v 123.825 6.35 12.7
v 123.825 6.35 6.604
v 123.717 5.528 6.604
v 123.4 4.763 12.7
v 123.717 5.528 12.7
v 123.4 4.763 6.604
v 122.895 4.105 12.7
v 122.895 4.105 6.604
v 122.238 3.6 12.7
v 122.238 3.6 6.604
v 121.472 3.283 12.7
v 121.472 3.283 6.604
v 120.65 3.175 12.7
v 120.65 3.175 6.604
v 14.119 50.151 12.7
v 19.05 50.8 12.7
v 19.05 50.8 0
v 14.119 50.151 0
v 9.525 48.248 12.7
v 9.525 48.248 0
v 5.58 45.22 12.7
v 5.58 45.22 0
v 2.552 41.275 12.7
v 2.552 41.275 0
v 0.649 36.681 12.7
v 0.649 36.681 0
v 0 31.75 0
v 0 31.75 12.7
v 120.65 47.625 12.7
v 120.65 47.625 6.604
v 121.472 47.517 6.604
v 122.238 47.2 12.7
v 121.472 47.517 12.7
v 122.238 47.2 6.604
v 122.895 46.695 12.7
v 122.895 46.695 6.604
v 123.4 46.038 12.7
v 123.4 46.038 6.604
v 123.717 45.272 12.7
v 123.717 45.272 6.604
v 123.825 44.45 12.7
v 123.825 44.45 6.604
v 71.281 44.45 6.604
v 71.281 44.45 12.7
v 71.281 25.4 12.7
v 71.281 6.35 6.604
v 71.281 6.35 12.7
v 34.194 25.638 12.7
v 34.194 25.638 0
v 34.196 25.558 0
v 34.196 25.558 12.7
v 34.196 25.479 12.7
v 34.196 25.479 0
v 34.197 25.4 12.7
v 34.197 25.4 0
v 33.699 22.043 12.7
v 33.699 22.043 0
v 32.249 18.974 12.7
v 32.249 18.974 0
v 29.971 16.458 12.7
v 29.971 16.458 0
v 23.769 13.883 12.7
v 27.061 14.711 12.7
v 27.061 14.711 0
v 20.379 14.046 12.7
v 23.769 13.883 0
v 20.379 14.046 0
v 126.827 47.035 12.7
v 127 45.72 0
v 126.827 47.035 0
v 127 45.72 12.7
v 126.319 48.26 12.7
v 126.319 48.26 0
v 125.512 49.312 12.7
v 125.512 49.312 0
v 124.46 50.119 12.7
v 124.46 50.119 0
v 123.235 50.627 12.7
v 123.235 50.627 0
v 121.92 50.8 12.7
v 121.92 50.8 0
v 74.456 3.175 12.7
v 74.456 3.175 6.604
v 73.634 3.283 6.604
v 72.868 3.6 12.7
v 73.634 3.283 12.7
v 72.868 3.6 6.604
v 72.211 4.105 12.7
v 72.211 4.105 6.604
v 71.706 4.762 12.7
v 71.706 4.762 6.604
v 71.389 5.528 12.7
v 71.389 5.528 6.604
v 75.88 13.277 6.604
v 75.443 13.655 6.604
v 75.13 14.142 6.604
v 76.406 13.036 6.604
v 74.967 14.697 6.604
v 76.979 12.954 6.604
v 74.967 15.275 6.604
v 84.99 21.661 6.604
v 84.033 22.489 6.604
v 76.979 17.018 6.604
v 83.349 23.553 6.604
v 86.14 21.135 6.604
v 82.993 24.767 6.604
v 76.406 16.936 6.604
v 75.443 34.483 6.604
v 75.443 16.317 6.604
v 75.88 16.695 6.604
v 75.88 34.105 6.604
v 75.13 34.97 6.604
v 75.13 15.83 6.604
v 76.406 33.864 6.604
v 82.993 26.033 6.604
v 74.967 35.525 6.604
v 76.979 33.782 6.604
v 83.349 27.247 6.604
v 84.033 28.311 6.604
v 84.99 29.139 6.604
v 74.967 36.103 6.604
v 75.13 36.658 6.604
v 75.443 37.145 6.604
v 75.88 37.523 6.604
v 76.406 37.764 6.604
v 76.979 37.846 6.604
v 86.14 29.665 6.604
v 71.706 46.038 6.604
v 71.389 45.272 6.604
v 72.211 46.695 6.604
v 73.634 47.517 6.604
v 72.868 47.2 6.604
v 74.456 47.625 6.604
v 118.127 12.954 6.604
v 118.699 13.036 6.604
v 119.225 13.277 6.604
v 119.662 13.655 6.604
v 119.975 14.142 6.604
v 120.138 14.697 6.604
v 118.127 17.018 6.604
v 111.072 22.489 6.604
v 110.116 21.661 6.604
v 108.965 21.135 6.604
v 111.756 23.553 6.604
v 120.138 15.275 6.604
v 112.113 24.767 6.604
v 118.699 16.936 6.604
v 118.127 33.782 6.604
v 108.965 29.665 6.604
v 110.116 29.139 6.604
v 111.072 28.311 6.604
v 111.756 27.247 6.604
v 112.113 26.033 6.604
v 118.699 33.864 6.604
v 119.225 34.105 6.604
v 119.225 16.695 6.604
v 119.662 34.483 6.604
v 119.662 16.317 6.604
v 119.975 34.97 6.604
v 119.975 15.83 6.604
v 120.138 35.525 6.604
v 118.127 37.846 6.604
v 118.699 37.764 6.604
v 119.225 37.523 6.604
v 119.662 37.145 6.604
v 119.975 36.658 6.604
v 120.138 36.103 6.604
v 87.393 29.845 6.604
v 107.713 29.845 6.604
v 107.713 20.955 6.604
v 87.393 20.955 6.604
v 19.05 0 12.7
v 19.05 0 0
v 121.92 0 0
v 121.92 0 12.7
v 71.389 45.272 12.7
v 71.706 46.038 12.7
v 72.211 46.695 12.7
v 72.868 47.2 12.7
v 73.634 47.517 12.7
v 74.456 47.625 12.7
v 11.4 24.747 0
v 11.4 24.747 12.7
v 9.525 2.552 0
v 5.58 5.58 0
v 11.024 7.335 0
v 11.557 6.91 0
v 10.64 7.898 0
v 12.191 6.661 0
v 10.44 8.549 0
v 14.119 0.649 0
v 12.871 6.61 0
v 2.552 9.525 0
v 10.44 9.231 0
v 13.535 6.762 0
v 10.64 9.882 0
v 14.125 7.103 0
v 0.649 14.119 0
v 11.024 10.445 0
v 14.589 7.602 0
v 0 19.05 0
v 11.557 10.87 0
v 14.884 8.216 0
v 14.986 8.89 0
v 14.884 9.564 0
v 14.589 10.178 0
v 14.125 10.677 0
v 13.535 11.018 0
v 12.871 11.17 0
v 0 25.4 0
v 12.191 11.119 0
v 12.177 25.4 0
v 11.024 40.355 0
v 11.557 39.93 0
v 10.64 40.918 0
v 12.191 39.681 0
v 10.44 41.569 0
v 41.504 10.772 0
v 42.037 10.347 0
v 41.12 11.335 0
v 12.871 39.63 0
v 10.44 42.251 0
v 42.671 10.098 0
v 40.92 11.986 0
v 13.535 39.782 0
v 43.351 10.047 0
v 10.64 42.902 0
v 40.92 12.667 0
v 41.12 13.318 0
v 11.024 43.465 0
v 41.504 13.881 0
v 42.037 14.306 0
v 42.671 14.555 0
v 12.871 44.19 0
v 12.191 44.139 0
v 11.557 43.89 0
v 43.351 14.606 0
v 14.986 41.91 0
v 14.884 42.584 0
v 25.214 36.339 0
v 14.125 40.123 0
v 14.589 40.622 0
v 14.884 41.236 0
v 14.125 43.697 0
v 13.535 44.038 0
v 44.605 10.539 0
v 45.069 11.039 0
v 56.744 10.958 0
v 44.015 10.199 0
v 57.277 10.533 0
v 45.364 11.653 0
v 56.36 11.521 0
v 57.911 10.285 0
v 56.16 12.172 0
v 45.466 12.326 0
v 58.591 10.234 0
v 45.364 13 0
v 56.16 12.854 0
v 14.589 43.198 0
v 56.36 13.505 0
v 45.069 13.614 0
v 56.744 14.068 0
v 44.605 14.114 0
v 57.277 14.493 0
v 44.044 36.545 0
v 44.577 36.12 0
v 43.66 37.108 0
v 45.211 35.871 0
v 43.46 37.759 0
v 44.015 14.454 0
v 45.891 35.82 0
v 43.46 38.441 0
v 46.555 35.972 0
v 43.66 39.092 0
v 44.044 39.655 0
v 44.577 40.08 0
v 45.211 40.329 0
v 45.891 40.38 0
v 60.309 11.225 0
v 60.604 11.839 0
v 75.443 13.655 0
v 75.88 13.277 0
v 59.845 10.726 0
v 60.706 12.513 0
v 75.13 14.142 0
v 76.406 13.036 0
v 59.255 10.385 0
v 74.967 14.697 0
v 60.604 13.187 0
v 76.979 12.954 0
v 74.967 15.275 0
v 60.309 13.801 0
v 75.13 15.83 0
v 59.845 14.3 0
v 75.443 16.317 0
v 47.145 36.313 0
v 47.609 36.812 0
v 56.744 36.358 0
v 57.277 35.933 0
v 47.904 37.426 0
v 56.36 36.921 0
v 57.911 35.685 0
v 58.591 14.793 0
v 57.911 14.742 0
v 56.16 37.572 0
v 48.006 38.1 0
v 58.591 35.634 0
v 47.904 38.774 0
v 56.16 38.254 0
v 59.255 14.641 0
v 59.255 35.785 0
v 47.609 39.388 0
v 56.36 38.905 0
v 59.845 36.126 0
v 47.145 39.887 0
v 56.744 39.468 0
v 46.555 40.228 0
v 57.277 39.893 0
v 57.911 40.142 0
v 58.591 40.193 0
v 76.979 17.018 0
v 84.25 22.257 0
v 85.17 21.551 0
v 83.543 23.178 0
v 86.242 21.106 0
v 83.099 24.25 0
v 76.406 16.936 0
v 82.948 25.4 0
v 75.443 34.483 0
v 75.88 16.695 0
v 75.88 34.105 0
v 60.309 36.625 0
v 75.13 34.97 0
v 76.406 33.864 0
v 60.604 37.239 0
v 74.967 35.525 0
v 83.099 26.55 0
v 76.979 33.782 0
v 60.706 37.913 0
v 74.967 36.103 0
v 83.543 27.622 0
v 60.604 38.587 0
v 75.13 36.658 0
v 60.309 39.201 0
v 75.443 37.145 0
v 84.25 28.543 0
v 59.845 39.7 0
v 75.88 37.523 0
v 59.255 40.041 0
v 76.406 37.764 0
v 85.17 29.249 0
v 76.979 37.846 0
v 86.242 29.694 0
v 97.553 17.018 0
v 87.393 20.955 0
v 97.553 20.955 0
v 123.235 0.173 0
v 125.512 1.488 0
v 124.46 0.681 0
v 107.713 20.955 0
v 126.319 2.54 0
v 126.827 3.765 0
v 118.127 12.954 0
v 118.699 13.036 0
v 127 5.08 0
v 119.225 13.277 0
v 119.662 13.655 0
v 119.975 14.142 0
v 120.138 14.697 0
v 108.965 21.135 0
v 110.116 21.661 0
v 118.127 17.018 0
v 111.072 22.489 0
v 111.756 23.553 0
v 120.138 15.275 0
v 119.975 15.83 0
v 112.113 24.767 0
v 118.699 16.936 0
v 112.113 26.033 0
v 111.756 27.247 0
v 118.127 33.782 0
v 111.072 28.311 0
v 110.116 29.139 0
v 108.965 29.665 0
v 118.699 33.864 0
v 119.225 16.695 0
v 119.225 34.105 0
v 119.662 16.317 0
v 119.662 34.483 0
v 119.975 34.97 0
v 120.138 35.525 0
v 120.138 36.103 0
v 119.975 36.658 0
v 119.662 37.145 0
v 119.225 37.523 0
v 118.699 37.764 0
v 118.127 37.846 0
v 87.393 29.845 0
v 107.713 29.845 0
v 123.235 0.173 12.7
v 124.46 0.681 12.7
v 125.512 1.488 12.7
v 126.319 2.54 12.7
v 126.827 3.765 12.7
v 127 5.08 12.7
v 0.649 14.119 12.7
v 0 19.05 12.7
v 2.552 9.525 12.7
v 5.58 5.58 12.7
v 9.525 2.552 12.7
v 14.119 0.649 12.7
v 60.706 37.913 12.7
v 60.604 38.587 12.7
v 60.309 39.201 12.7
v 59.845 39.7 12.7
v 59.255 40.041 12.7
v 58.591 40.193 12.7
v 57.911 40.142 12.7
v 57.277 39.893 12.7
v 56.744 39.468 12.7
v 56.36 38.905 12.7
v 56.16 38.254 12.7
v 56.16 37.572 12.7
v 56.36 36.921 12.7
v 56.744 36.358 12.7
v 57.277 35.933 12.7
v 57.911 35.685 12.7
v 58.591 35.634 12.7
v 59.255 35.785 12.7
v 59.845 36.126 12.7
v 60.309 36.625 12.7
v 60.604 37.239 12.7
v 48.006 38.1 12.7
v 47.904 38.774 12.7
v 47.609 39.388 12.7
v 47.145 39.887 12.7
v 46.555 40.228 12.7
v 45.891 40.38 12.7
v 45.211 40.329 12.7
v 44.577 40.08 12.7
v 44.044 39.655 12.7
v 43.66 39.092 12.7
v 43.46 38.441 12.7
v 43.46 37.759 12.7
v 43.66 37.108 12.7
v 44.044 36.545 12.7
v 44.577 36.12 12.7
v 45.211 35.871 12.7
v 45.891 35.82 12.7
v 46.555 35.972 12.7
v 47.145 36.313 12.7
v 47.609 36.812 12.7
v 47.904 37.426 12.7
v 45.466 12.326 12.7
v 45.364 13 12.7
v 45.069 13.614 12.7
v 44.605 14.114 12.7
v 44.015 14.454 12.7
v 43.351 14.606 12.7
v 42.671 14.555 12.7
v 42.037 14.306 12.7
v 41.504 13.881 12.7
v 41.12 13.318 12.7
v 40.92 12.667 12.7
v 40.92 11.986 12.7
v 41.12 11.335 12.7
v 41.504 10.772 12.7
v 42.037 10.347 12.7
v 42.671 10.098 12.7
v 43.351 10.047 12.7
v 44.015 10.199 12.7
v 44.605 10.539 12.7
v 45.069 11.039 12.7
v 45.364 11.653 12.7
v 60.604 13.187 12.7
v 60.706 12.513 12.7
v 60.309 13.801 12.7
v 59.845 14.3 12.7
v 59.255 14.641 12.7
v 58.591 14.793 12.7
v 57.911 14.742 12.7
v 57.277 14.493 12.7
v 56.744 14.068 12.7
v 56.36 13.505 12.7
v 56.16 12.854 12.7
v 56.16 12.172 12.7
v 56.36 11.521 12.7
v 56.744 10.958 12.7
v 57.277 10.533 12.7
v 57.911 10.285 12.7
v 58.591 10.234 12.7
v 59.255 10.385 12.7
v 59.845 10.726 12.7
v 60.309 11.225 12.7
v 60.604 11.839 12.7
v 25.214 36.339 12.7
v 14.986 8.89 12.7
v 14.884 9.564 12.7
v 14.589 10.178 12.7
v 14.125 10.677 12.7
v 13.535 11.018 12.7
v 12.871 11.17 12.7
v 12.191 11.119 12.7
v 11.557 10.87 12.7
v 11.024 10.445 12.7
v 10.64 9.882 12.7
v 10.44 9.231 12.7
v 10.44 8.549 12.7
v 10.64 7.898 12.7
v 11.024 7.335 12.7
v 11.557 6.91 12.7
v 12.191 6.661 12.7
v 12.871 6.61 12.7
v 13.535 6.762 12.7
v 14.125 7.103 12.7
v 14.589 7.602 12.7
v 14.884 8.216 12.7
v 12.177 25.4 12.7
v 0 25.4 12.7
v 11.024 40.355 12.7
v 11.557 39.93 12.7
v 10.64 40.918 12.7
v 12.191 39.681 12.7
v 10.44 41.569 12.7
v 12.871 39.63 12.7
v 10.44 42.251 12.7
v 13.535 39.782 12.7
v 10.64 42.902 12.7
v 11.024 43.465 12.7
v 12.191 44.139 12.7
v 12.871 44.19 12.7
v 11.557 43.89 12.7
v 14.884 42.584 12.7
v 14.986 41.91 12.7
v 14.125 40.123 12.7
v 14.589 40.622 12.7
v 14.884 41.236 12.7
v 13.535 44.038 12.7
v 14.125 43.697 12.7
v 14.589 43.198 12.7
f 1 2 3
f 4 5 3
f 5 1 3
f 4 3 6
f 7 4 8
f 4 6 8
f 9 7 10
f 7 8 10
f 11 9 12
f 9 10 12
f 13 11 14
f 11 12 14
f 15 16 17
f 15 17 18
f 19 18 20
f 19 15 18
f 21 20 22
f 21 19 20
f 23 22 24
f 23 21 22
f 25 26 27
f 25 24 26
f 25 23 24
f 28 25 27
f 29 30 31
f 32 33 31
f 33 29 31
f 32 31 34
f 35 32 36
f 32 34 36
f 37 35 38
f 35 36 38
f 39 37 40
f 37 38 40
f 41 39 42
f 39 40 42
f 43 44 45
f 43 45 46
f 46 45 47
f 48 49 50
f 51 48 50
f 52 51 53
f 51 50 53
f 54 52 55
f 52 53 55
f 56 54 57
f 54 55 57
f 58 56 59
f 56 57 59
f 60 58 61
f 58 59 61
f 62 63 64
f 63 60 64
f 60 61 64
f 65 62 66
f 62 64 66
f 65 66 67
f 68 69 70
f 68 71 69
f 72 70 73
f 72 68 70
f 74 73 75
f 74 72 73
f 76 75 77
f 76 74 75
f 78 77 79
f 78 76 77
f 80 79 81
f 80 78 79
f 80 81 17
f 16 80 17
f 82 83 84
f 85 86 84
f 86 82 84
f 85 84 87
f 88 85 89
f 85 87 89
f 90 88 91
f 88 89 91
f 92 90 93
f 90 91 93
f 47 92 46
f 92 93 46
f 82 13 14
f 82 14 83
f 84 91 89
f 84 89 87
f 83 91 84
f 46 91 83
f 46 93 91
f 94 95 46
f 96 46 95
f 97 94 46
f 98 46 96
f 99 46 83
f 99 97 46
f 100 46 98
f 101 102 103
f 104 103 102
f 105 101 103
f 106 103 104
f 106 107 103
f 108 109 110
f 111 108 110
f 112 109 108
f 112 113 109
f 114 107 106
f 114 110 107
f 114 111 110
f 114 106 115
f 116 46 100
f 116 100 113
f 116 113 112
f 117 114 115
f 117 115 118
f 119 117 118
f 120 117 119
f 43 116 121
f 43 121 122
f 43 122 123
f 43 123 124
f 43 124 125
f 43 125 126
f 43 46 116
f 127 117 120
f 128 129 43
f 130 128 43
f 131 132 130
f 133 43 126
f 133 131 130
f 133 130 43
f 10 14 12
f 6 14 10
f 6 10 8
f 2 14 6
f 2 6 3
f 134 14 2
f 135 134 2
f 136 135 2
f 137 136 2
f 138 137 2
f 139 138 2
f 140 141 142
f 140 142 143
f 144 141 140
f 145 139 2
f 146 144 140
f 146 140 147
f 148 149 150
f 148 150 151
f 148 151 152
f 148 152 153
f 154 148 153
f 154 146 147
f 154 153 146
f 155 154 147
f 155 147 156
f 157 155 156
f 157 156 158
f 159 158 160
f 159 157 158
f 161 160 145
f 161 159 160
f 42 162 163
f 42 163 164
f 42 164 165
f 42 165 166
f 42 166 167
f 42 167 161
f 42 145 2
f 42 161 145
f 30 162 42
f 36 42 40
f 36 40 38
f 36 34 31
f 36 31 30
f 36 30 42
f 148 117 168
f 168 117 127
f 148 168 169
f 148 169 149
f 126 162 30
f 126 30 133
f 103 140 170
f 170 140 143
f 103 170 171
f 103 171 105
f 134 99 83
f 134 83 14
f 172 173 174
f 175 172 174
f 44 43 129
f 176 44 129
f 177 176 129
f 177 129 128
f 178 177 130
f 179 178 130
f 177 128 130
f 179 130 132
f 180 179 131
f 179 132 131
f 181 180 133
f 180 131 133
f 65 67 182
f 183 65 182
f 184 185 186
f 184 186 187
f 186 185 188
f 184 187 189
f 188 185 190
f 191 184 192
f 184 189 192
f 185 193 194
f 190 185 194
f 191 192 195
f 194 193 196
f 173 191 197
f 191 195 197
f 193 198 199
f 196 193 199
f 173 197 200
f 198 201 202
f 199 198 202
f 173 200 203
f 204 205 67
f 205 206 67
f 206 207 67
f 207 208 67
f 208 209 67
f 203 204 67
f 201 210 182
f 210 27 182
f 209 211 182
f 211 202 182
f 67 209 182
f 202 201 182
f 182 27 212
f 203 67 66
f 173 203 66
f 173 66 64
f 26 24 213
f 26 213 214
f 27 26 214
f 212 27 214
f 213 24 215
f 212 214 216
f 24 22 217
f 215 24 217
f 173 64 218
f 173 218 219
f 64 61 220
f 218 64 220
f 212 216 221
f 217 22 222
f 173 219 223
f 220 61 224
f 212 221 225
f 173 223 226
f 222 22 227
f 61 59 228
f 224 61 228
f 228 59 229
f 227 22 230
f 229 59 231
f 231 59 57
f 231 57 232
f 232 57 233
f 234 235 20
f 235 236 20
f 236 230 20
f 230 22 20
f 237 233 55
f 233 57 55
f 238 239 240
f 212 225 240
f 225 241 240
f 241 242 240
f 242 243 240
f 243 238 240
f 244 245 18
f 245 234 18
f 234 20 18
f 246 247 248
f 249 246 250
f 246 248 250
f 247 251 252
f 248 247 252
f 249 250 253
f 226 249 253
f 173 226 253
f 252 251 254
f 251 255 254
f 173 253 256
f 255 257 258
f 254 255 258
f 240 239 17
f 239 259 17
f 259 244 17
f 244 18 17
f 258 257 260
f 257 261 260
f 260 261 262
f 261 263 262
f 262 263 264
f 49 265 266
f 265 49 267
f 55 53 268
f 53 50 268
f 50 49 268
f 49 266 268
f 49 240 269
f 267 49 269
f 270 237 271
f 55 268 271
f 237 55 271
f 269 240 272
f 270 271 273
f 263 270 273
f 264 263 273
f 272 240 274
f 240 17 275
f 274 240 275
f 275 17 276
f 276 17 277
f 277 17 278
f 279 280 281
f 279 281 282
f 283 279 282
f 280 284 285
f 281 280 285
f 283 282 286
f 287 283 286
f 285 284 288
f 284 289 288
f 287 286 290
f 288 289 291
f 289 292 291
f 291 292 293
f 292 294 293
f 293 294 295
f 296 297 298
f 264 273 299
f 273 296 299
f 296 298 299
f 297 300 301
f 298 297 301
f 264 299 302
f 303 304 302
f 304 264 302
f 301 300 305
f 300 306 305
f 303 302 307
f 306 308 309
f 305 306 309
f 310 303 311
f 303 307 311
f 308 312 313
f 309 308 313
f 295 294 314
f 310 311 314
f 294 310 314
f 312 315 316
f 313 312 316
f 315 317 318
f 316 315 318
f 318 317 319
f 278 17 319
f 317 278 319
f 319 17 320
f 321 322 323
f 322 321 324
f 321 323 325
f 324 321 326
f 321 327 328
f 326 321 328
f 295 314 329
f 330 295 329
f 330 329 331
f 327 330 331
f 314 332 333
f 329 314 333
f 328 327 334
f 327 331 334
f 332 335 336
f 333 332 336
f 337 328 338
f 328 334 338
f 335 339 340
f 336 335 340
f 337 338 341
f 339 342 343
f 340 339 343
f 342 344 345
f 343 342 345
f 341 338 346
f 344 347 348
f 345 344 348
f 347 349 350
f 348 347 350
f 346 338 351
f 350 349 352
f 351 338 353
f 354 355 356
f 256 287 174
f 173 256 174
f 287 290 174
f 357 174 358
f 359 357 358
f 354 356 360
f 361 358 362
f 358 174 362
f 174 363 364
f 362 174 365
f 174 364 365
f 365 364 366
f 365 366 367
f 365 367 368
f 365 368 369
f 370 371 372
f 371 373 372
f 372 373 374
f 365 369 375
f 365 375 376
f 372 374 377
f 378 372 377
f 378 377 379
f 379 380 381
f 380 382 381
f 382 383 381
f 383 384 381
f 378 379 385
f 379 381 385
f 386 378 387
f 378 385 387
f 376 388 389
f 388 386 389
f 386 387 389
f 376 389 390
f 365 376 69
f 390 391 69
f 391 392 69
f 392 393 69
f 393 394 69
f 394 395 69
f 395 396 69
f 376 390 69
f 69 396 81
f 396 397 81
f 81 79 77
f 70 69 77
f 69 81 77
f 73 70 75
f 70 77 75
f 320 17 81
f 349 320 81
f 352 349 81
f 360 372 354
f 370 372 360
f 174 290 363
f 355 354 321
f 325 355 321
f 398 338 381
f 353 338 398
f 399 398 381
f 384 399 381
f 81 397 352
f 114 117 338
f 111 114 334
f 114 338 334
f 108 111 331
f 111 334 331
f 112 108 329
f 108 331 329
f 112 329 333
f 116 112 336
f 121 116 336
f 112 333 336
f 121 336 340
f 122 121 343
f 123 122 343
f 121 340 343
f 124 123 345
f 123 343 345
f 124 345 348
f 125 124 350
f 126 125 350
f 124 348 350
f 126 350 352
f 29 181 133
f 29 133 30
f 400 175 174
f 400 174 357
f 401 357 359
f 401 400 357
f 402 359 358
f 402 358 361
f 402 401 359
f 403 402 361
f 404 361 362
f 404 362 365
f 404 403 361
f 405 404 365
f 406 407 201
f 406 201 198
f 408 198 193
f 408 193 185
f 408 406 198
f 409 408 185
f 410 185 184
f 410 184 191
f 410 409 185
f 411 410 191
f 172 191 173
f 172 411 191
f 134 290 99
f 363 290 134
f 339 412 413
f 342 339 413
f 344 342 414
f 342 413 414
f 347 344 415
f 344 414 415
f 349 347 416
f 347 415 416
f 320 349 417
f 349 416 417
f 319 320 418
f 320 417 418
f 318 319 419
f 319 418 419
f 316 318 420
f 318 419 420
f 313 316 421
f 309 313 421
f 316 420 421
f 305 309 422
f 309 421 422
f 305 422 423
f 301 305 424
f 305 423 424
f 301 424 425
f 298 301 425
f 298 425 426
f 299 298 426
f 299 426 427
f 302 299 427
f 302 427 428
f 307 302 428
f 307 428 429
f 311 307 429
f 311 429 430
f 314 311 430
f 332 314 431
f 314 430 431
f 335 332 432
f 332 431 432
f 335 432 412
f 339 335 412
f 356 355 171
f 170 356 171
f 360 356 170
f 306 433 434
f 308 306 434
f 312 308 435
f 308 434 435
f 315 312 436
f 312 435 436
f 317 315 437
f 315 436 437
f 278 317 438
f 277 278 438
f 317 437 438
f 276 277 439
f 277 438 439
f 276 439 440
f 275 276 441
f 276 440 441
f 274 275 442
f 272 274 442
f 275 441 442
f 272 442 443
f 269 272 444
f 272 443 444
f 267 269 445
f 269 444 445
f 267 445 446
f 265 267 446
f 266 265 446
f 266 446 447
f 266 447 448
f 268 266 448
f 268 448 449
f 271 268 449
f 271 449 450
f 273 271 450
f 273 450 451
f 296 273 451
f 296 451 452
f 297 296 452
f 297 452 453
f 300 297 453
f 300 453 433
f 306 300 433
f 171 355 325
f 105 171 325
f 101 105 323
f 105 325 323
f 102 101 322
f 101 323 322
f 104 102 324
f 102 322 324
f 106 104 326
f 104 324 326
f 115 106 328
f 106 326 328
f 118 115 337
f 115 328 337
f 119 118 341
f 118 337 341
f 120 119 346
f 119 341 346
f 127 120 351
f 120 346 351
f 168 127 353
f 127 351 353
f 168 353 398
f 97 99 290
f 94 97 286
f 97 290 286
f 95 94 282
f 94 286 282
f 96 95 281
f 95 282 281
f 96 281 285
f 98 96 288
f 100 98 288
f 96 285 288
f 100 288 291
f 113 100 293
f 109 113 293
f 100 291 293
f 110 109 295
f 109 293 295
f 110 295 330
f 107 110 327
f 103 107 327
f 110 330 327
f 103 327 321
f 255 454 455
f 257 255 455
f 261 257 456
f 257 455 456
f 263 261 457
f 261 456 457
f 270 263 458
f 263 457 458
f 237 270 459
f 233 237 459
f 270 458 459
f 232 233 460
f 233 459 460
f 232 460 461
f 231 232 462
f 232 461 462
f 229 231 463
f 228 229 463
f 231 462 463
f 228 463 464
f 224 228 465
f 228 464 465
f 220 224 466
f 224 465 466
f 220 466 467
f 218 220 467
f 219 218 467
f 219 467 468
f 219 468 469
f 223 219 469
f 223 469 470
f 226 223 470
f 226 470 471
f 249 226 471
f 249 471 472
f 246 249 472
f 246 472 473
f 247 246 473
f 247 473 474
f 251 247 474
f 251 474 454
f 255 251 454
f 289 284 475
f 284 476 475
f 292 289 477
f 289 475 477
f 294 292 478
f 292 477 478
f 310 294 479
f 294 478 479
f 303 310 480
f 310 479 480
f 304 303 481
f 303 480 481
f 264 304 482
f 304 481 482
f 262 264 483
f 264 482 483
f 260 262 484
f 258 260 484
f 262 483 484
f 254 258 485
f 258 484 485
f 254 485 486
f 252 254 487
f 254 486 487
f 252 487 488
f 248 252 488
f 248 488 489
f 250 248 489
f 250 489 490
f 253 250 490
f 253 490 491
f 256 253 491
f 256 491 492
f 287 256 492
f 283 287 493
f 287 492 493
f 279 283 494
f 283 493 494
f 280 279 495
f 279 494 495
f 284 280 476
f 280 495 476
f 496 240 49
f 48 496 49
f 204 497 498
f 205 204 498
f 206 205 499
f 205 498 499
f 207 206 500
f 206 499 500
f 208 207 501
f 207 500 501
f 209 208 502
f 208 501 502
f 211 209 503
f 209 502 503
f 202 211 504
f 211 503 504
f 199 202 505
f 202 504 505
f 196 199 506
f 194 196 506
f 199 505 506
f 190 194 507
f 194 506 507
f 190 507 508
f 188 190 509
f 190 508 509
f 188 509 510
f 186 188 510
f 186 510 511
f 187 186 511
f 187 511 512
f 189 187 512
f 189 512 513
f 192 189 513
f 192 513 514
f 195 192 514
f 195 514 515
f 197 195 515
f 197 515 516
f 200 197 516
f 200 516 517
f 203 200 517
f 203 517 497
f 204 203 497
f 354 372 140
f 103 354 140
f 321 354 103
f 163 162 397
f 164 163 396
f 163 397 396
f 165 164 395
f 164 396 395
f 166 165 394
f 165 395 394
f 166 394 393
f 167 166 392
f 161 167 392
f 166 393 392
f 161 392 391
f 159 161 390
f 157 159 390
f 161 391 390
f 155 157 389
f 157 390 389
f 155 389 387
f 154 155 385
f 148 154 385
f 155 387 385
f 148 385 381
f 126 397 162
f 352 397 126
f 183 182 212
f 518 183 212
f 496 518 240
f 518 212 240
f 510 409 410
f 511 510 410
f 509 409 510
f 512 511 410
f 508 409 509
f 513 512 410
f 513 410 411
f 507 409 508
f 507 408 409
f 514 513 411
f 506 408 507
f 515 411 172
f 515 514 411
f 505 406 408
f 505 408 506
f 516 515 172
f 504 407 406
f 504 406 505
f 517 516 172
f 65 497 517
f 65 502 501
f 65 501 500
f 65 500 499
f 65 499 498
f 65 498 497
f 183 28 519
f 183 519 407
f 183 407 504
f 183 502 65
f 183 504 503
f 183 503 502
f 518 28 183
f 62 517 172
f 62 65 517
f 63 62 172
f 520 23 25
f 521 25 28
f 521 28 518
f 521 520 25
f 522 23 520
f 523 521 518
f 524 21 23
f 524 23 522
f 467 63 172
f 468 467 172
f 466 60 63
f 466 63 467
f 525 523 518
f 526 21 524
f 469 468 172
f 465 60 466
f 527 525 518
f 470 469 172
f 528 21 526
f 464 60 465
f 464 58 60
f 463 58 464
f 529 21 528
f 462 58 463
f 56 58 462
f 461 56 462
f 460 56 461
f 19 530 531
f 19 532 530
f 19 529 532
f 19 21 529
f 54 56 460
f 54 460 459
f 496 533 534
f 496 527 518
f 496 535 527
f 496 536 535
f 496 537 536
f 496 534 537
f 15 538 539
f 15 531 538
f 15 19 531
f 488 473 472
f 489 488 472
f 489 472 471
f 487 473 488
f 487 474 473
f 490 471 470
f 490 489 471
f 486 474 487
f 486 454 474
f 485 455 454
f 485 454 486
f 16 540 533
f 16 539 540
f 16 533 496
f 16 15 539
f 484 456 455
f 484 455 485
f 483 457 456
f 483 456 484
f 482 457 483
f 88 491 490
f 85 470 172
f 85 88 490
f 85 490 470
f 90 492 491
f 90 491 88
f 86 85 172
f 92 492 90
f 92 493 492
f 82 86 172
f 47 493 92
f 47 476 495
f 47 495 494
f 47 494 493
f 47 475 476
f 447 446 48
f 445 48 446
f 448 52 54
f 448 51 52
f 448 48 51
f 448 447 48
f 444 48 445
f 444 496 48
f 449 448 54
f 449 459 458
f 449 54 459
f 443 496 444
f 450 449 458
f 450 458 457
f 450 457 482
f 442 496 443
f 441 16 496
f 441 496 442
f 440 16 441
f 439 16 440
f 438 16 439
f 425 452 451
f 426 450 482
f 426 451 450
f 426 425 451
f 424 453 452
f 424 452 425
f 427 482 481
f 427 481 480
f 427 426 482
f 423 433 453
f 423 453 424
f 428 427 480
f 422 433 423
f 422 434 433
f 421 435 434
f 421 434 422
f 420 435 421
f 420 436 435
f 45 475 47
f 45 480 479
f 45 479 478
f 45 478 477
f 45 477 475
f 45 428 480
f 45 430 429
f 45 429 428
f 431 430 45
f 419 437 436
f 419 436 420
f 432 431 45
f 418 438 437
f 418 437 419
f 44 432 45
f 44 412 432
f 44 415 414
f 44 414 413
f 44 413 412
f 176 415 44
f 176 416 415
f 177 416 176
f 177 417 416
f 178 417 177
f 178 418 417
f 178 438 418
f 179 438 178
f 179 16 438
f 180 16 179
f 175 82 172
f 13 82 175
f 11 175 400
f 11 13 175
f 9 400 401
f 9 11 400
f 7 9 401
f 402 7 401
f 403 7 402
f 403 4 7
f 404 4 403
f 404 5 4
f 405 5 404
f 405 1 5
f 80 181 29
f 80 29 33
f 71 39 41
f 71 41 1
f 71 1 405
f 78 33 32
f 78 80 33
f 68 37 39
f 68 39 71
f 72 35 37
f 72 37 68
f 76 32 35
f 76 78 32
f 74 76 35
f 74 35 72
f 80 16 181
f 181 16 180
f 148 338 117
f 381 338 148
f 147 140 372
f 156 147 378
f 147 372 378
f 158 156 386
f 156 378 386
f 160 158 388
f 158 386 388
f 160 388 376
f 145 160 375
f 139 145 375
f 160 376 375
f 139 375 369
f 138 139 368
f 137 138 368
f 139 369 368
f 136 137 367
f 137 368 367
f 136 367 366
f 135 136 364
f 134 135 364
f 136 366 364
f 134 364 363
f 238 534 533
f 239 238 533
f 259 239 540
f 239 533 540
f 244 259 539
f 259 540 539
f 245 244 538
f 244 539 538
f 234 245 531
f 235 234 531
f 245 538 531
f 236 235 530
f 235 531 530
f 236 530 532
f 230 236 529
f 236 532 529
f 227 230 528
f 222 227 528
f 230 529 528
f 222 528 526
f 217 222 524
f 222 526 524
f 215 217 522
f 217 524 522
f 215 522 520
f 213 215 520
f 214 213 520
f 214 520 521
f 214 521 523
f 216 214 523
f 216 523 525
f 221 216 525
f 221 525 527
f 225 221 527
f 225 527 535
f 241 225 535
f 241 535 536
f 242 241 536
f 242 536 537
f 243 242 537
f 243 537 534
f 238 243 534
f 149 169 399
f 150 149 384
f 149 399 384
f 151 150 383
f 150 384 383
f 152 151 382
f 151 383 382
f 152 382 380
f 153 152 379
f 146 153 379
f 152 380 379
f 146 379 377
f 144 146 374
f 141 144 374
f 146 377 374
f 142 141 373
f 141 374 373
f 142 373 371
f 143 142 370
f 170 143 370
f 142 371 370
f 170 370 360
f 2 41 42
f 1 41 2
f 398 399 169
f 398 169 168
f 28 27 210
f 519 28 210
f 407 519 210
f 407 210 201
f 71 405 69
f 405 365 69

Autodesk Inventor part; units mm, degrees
ref_plane "YZ Plane" through (0, 0, 0) normal (1, 0, 0) x (0, 1, 0)
ref_plane "XZ Plane" through (0, 0, 0) normal (0, 1, 0) x (-1, 0, 0)
ref_plane "XY Plane" through (0, 0, 0) normal (0, 0, 1) x (1, 0, 0)
sketch "Sketch1" plane through (0, 0, 0) normal (0, 0, 1) x (1, 0, 0)
  line L0 (0, 0) -> (127, 0)
  line L1 (127, 0) -> (127, 50.8)
  line L2 (127, 50.8) -> (0, 50.8)
  line L3 (0, 50.8) -> (0, 0)
  line L4 (0, 25.4) -> (6.35, 25.4)
  line L5 (0, 25.4) -> (6.35, 25.4) construction
  line L6 (6.35, 25.4) -> (15.367, 25.4)
  line L7 (127, 25.4) -> (120.65, 25.4)
  line L8 (127, 25.4) -> (133.35, 25.4) construction
  line L9 (15.367, 25.4) -> (15.367, 34.417)
  line L10 (15.367, 25.4) -> (24.384, 25.4) construction
  line L11 (15.367, 25.4) -> (15.367, 16.383)
  line L12 (20.3793, 14.0457) -> (11.3996, 24.7474)
  line L13 (24.8663, 36.7543) -> (33.846, 26.0526) construction
  line L14 (11.3996, 24.7474) -> (25.2144, 36.3394)
  line L15 (25.2144, 36.3394) -> (34.1942, 25.6377)
  line L16 (15.367, 25.4) -> (11.049, 25.4)
  arc A0 (20.3793, 14.0457) -> (34.1942, 25.6377) centre (22.6228, 25.4) ccw
  line L17 (120.65, 25.4) -> (131.064, 25.4) construction
  line L18 (22.6228, 25.4) -> (107.7128, 25.4)
  line L19 (22.6228, 25.4) -> (107.7128, 25.4) construction
  line L20 (22.6228, 25.4) -> (87.3928, 25.4)
  line L21 (22.6228, 25.4) -> (87.3928, 25.4) construction
  line L22 (87.3928, 25.4) -> (107.7128, 25.4)
  line L23 (107.7128, 25.4) -> (87.3928, 25.4) construction
  line L24 (107.7128, 29.845) -> (87.3928, 29.845)
  line L25 (87.3928, 20.955) -> (107.7128, 20.955)
  arc A1 (107.7128, 20.955) -> (107.7128, 29.845) centre (107.7128, 25.4) ccw
  arc A2 (87.3928, 29.845) -> (87.3928, 20.955) centre (87.3928, 25.4) ccw
  line L26 (107.7128, 25.4) -> (107.7128, 35.814)
  line L27 (107.7128, 25.4) -> (118.1268, 25.4) construction
  line L28 (107.7128, 35.814) -> (118.1268, 35.814)
  line L29 (107.7128, 35.814) -> (118.1268, 35.814) construction
  line L30 (107.7128, 14.986) -> (118.1268, 14.986)
  line L31 (97.5528, 25.4) -> (97.5528, 27.2043)
  line L32 (87.3928, 35.814) -> (76.9788, 35.814)
  line L33 (87.3928, 35.814) -> (76.9788, 35.814) construction
  line L34 (87.3928, 14.986) -> (76.9788, 14.986)
  line L35 (97.5528, 35.814) -> (97.5528, 14.986)
  line L36 (97.5528, 35.814) -> (118.3808, 35.814) construction
  line L37 (118.1268, 35.814) -> (76.9788, 35.814) construction
  line L38 (118.1268, 37.846) -> (76.9788, 37.846)
  line L39 (76.9788, 33.782) -> (118.1268, 33.782)
  arc A3 (118.1268, 33.782) -> (118.1268, 37.846) centre (118.1268, 35.814) ccw
  arc A4 (76.9788, 37.846) -> (76.9788, 33.782) centre (76.9788, 35.814) ccw
  line L40 (118.1268, 14.986) -> (76.9788, 14.986) construction
  line L41 (118.1268, 17.018) -> (76.9788, 17.018)
  line L42 (76.9788, 12.954) -> (118.1268, 12.954)
  arc A5 (118.1268, 12.954) -> (118.1268, 17.018) centre (118.1268, 14.986) ccw
  arc A6 (76.9788, 17.018) -> (76.9788, 12.954) centre (76.9788, 14.986) ccw
  dimension "d1" = 127
  dimension "d2" = 50.8
  dimension "d3" = 6.35
  dimension "d4" = 0
  dimension "d5" = 9.017
  dimension "d6" = 180
  dimension "d7" = 6.35
  dimension "d8" = 180
  dimension "d11" = 9.017
  dimension "d12" = 90
  dimension "d13" = 13.97
  dimension "d14" = 180
  dimension "d15" = 4.318
  dimension "d18" = 85.09
  dimension "d20" = 64.77
  dimension "d22" = 8.89
  dimension "d23" = 10.414
  dimension "d24" = 90
  dimension "d25" = 10.414
  dimension "d26" = 0
  dimension "d27" = 90
  dimension "d28" = 4.064
  dimension "d29" = 4.064
  dimension "d41" = 20.828
extrude "Extrusion1" add sketch "Sketch1" along normal blind 12.7 contours L3 L2 L1 L0 | L35 L39 L26 L24
sketch "Sketch2" plane through (0, 0, 12.7) normal (0, 0, 1) x (1, 0, 0)
  line L0 (127, 0) -> (127, 50.8)
  line L1 (71.2806, 47.625) -> (123.825, 47.625)
  line L2 (123.825, 47.625) -> (123.825, 3.175)
  line L3 (123.825, 3.175) -> (71.2806, 3.175)
  line L4 (71.2806, 47.625) -> (71.2806, 3.175)
  line L5 (127, 50.8) -> (68.1056, 50.8)
  line L6 (68.1056, 0) -> (127, 0)
  line L7 (68.1056, 50.8) -> (68.1056, 0)
  point P0 (0, 0)
extrude "Extrusion2" cut sketch "Sketch2" against normal blind 6.096 contours L1 L2 L3 L4
fillet "Fillet1" radius 5.08 2 edges at (127, 0, 6.35) (127, 50.8, 6.35)
fillet "Fillet2" radius 3.175 4 edges at (123.825, 47.625, 9.652) (71.2806, 47.625, 9.652) (71.2806, 3.175, 9.652) (123.825, 3.175, 9.652)
sketch "Sketch3" plane through (0, 0, 12.7) normal (0, 0, 1) x (1, 0, 0)
  line L0 (121.92, 50.8) -> (0, 50.8) projected
  line L1 (60.96, 50.8) -> (60.96, -0.3735)
  line L2 (60.96, 50.8) -> (112.1335, 50.8) construction
  line L3 (60.96, -0.3735) -> (60.96, 12.3265)
  line L4 (60.96, 12.3265) -> (43.18, 12.3265)
  circle A0 centre (43.18, 12.3265) radius 2.286
  circle A1 centre (45.72, 38.1) radius 2.286
  line L5 (0, 50.8) -> (0, 0) projected
  line L6 (0, 25.4) -> (12.7, 25.4)
  line L7 (0, 25.4) -> (12.7, 25.4) construction
  line L8 (12.7, 25.4) -> (12.7, 8.89)
  line L9 (12.7, 25.4) -> (29.21, 25.4) construction
  circle A2 centre (12.7, 8.89) radius 2.286
  circle A3 centre (12.7, 41.91) radius 2.286
  line L10 (60.96, 25.2132) -> (58.42, 25.2132)
  line L11 (60.96, 25.2132) -> (63.5, 25.2132) construction
  line L12 (58.42, 25.2132) -> (58.42, 37.9132)
  circle A4 centre (58.42, 37.9132) radius 2.286
  circle A5 centre (58.42, 12.5132) radius 2.286
  point P0 (3.175, 50.8)
  point P1 (0, 47.625)
  point P2 (0, 3.175)
  dimension "d42" = 90
  dimension "d43" = 12.7
  dimension "d44" = 0
  dimension "d45" = 17.78
  dimension "d46" = 4.572
  dimension "d47" = 12.7
  dimension "d48" = 0
  dimension "d49" = 16.51
  dimension "d50" = 90
  dimension "d51" = 4.572
  dimension "d52" = 2.54
  dimension "d53" = 180
  dimension "d54" = 4.572
extrude "Extrusion3" cut sketch "Sketch3" against normal blind 25.4
fillet "Fillet3" radius 19.05 2 edges at (0, 50.8, 6.35) (0, 0, 6.35)
properties part number "Skateboard Motor Bracket"
